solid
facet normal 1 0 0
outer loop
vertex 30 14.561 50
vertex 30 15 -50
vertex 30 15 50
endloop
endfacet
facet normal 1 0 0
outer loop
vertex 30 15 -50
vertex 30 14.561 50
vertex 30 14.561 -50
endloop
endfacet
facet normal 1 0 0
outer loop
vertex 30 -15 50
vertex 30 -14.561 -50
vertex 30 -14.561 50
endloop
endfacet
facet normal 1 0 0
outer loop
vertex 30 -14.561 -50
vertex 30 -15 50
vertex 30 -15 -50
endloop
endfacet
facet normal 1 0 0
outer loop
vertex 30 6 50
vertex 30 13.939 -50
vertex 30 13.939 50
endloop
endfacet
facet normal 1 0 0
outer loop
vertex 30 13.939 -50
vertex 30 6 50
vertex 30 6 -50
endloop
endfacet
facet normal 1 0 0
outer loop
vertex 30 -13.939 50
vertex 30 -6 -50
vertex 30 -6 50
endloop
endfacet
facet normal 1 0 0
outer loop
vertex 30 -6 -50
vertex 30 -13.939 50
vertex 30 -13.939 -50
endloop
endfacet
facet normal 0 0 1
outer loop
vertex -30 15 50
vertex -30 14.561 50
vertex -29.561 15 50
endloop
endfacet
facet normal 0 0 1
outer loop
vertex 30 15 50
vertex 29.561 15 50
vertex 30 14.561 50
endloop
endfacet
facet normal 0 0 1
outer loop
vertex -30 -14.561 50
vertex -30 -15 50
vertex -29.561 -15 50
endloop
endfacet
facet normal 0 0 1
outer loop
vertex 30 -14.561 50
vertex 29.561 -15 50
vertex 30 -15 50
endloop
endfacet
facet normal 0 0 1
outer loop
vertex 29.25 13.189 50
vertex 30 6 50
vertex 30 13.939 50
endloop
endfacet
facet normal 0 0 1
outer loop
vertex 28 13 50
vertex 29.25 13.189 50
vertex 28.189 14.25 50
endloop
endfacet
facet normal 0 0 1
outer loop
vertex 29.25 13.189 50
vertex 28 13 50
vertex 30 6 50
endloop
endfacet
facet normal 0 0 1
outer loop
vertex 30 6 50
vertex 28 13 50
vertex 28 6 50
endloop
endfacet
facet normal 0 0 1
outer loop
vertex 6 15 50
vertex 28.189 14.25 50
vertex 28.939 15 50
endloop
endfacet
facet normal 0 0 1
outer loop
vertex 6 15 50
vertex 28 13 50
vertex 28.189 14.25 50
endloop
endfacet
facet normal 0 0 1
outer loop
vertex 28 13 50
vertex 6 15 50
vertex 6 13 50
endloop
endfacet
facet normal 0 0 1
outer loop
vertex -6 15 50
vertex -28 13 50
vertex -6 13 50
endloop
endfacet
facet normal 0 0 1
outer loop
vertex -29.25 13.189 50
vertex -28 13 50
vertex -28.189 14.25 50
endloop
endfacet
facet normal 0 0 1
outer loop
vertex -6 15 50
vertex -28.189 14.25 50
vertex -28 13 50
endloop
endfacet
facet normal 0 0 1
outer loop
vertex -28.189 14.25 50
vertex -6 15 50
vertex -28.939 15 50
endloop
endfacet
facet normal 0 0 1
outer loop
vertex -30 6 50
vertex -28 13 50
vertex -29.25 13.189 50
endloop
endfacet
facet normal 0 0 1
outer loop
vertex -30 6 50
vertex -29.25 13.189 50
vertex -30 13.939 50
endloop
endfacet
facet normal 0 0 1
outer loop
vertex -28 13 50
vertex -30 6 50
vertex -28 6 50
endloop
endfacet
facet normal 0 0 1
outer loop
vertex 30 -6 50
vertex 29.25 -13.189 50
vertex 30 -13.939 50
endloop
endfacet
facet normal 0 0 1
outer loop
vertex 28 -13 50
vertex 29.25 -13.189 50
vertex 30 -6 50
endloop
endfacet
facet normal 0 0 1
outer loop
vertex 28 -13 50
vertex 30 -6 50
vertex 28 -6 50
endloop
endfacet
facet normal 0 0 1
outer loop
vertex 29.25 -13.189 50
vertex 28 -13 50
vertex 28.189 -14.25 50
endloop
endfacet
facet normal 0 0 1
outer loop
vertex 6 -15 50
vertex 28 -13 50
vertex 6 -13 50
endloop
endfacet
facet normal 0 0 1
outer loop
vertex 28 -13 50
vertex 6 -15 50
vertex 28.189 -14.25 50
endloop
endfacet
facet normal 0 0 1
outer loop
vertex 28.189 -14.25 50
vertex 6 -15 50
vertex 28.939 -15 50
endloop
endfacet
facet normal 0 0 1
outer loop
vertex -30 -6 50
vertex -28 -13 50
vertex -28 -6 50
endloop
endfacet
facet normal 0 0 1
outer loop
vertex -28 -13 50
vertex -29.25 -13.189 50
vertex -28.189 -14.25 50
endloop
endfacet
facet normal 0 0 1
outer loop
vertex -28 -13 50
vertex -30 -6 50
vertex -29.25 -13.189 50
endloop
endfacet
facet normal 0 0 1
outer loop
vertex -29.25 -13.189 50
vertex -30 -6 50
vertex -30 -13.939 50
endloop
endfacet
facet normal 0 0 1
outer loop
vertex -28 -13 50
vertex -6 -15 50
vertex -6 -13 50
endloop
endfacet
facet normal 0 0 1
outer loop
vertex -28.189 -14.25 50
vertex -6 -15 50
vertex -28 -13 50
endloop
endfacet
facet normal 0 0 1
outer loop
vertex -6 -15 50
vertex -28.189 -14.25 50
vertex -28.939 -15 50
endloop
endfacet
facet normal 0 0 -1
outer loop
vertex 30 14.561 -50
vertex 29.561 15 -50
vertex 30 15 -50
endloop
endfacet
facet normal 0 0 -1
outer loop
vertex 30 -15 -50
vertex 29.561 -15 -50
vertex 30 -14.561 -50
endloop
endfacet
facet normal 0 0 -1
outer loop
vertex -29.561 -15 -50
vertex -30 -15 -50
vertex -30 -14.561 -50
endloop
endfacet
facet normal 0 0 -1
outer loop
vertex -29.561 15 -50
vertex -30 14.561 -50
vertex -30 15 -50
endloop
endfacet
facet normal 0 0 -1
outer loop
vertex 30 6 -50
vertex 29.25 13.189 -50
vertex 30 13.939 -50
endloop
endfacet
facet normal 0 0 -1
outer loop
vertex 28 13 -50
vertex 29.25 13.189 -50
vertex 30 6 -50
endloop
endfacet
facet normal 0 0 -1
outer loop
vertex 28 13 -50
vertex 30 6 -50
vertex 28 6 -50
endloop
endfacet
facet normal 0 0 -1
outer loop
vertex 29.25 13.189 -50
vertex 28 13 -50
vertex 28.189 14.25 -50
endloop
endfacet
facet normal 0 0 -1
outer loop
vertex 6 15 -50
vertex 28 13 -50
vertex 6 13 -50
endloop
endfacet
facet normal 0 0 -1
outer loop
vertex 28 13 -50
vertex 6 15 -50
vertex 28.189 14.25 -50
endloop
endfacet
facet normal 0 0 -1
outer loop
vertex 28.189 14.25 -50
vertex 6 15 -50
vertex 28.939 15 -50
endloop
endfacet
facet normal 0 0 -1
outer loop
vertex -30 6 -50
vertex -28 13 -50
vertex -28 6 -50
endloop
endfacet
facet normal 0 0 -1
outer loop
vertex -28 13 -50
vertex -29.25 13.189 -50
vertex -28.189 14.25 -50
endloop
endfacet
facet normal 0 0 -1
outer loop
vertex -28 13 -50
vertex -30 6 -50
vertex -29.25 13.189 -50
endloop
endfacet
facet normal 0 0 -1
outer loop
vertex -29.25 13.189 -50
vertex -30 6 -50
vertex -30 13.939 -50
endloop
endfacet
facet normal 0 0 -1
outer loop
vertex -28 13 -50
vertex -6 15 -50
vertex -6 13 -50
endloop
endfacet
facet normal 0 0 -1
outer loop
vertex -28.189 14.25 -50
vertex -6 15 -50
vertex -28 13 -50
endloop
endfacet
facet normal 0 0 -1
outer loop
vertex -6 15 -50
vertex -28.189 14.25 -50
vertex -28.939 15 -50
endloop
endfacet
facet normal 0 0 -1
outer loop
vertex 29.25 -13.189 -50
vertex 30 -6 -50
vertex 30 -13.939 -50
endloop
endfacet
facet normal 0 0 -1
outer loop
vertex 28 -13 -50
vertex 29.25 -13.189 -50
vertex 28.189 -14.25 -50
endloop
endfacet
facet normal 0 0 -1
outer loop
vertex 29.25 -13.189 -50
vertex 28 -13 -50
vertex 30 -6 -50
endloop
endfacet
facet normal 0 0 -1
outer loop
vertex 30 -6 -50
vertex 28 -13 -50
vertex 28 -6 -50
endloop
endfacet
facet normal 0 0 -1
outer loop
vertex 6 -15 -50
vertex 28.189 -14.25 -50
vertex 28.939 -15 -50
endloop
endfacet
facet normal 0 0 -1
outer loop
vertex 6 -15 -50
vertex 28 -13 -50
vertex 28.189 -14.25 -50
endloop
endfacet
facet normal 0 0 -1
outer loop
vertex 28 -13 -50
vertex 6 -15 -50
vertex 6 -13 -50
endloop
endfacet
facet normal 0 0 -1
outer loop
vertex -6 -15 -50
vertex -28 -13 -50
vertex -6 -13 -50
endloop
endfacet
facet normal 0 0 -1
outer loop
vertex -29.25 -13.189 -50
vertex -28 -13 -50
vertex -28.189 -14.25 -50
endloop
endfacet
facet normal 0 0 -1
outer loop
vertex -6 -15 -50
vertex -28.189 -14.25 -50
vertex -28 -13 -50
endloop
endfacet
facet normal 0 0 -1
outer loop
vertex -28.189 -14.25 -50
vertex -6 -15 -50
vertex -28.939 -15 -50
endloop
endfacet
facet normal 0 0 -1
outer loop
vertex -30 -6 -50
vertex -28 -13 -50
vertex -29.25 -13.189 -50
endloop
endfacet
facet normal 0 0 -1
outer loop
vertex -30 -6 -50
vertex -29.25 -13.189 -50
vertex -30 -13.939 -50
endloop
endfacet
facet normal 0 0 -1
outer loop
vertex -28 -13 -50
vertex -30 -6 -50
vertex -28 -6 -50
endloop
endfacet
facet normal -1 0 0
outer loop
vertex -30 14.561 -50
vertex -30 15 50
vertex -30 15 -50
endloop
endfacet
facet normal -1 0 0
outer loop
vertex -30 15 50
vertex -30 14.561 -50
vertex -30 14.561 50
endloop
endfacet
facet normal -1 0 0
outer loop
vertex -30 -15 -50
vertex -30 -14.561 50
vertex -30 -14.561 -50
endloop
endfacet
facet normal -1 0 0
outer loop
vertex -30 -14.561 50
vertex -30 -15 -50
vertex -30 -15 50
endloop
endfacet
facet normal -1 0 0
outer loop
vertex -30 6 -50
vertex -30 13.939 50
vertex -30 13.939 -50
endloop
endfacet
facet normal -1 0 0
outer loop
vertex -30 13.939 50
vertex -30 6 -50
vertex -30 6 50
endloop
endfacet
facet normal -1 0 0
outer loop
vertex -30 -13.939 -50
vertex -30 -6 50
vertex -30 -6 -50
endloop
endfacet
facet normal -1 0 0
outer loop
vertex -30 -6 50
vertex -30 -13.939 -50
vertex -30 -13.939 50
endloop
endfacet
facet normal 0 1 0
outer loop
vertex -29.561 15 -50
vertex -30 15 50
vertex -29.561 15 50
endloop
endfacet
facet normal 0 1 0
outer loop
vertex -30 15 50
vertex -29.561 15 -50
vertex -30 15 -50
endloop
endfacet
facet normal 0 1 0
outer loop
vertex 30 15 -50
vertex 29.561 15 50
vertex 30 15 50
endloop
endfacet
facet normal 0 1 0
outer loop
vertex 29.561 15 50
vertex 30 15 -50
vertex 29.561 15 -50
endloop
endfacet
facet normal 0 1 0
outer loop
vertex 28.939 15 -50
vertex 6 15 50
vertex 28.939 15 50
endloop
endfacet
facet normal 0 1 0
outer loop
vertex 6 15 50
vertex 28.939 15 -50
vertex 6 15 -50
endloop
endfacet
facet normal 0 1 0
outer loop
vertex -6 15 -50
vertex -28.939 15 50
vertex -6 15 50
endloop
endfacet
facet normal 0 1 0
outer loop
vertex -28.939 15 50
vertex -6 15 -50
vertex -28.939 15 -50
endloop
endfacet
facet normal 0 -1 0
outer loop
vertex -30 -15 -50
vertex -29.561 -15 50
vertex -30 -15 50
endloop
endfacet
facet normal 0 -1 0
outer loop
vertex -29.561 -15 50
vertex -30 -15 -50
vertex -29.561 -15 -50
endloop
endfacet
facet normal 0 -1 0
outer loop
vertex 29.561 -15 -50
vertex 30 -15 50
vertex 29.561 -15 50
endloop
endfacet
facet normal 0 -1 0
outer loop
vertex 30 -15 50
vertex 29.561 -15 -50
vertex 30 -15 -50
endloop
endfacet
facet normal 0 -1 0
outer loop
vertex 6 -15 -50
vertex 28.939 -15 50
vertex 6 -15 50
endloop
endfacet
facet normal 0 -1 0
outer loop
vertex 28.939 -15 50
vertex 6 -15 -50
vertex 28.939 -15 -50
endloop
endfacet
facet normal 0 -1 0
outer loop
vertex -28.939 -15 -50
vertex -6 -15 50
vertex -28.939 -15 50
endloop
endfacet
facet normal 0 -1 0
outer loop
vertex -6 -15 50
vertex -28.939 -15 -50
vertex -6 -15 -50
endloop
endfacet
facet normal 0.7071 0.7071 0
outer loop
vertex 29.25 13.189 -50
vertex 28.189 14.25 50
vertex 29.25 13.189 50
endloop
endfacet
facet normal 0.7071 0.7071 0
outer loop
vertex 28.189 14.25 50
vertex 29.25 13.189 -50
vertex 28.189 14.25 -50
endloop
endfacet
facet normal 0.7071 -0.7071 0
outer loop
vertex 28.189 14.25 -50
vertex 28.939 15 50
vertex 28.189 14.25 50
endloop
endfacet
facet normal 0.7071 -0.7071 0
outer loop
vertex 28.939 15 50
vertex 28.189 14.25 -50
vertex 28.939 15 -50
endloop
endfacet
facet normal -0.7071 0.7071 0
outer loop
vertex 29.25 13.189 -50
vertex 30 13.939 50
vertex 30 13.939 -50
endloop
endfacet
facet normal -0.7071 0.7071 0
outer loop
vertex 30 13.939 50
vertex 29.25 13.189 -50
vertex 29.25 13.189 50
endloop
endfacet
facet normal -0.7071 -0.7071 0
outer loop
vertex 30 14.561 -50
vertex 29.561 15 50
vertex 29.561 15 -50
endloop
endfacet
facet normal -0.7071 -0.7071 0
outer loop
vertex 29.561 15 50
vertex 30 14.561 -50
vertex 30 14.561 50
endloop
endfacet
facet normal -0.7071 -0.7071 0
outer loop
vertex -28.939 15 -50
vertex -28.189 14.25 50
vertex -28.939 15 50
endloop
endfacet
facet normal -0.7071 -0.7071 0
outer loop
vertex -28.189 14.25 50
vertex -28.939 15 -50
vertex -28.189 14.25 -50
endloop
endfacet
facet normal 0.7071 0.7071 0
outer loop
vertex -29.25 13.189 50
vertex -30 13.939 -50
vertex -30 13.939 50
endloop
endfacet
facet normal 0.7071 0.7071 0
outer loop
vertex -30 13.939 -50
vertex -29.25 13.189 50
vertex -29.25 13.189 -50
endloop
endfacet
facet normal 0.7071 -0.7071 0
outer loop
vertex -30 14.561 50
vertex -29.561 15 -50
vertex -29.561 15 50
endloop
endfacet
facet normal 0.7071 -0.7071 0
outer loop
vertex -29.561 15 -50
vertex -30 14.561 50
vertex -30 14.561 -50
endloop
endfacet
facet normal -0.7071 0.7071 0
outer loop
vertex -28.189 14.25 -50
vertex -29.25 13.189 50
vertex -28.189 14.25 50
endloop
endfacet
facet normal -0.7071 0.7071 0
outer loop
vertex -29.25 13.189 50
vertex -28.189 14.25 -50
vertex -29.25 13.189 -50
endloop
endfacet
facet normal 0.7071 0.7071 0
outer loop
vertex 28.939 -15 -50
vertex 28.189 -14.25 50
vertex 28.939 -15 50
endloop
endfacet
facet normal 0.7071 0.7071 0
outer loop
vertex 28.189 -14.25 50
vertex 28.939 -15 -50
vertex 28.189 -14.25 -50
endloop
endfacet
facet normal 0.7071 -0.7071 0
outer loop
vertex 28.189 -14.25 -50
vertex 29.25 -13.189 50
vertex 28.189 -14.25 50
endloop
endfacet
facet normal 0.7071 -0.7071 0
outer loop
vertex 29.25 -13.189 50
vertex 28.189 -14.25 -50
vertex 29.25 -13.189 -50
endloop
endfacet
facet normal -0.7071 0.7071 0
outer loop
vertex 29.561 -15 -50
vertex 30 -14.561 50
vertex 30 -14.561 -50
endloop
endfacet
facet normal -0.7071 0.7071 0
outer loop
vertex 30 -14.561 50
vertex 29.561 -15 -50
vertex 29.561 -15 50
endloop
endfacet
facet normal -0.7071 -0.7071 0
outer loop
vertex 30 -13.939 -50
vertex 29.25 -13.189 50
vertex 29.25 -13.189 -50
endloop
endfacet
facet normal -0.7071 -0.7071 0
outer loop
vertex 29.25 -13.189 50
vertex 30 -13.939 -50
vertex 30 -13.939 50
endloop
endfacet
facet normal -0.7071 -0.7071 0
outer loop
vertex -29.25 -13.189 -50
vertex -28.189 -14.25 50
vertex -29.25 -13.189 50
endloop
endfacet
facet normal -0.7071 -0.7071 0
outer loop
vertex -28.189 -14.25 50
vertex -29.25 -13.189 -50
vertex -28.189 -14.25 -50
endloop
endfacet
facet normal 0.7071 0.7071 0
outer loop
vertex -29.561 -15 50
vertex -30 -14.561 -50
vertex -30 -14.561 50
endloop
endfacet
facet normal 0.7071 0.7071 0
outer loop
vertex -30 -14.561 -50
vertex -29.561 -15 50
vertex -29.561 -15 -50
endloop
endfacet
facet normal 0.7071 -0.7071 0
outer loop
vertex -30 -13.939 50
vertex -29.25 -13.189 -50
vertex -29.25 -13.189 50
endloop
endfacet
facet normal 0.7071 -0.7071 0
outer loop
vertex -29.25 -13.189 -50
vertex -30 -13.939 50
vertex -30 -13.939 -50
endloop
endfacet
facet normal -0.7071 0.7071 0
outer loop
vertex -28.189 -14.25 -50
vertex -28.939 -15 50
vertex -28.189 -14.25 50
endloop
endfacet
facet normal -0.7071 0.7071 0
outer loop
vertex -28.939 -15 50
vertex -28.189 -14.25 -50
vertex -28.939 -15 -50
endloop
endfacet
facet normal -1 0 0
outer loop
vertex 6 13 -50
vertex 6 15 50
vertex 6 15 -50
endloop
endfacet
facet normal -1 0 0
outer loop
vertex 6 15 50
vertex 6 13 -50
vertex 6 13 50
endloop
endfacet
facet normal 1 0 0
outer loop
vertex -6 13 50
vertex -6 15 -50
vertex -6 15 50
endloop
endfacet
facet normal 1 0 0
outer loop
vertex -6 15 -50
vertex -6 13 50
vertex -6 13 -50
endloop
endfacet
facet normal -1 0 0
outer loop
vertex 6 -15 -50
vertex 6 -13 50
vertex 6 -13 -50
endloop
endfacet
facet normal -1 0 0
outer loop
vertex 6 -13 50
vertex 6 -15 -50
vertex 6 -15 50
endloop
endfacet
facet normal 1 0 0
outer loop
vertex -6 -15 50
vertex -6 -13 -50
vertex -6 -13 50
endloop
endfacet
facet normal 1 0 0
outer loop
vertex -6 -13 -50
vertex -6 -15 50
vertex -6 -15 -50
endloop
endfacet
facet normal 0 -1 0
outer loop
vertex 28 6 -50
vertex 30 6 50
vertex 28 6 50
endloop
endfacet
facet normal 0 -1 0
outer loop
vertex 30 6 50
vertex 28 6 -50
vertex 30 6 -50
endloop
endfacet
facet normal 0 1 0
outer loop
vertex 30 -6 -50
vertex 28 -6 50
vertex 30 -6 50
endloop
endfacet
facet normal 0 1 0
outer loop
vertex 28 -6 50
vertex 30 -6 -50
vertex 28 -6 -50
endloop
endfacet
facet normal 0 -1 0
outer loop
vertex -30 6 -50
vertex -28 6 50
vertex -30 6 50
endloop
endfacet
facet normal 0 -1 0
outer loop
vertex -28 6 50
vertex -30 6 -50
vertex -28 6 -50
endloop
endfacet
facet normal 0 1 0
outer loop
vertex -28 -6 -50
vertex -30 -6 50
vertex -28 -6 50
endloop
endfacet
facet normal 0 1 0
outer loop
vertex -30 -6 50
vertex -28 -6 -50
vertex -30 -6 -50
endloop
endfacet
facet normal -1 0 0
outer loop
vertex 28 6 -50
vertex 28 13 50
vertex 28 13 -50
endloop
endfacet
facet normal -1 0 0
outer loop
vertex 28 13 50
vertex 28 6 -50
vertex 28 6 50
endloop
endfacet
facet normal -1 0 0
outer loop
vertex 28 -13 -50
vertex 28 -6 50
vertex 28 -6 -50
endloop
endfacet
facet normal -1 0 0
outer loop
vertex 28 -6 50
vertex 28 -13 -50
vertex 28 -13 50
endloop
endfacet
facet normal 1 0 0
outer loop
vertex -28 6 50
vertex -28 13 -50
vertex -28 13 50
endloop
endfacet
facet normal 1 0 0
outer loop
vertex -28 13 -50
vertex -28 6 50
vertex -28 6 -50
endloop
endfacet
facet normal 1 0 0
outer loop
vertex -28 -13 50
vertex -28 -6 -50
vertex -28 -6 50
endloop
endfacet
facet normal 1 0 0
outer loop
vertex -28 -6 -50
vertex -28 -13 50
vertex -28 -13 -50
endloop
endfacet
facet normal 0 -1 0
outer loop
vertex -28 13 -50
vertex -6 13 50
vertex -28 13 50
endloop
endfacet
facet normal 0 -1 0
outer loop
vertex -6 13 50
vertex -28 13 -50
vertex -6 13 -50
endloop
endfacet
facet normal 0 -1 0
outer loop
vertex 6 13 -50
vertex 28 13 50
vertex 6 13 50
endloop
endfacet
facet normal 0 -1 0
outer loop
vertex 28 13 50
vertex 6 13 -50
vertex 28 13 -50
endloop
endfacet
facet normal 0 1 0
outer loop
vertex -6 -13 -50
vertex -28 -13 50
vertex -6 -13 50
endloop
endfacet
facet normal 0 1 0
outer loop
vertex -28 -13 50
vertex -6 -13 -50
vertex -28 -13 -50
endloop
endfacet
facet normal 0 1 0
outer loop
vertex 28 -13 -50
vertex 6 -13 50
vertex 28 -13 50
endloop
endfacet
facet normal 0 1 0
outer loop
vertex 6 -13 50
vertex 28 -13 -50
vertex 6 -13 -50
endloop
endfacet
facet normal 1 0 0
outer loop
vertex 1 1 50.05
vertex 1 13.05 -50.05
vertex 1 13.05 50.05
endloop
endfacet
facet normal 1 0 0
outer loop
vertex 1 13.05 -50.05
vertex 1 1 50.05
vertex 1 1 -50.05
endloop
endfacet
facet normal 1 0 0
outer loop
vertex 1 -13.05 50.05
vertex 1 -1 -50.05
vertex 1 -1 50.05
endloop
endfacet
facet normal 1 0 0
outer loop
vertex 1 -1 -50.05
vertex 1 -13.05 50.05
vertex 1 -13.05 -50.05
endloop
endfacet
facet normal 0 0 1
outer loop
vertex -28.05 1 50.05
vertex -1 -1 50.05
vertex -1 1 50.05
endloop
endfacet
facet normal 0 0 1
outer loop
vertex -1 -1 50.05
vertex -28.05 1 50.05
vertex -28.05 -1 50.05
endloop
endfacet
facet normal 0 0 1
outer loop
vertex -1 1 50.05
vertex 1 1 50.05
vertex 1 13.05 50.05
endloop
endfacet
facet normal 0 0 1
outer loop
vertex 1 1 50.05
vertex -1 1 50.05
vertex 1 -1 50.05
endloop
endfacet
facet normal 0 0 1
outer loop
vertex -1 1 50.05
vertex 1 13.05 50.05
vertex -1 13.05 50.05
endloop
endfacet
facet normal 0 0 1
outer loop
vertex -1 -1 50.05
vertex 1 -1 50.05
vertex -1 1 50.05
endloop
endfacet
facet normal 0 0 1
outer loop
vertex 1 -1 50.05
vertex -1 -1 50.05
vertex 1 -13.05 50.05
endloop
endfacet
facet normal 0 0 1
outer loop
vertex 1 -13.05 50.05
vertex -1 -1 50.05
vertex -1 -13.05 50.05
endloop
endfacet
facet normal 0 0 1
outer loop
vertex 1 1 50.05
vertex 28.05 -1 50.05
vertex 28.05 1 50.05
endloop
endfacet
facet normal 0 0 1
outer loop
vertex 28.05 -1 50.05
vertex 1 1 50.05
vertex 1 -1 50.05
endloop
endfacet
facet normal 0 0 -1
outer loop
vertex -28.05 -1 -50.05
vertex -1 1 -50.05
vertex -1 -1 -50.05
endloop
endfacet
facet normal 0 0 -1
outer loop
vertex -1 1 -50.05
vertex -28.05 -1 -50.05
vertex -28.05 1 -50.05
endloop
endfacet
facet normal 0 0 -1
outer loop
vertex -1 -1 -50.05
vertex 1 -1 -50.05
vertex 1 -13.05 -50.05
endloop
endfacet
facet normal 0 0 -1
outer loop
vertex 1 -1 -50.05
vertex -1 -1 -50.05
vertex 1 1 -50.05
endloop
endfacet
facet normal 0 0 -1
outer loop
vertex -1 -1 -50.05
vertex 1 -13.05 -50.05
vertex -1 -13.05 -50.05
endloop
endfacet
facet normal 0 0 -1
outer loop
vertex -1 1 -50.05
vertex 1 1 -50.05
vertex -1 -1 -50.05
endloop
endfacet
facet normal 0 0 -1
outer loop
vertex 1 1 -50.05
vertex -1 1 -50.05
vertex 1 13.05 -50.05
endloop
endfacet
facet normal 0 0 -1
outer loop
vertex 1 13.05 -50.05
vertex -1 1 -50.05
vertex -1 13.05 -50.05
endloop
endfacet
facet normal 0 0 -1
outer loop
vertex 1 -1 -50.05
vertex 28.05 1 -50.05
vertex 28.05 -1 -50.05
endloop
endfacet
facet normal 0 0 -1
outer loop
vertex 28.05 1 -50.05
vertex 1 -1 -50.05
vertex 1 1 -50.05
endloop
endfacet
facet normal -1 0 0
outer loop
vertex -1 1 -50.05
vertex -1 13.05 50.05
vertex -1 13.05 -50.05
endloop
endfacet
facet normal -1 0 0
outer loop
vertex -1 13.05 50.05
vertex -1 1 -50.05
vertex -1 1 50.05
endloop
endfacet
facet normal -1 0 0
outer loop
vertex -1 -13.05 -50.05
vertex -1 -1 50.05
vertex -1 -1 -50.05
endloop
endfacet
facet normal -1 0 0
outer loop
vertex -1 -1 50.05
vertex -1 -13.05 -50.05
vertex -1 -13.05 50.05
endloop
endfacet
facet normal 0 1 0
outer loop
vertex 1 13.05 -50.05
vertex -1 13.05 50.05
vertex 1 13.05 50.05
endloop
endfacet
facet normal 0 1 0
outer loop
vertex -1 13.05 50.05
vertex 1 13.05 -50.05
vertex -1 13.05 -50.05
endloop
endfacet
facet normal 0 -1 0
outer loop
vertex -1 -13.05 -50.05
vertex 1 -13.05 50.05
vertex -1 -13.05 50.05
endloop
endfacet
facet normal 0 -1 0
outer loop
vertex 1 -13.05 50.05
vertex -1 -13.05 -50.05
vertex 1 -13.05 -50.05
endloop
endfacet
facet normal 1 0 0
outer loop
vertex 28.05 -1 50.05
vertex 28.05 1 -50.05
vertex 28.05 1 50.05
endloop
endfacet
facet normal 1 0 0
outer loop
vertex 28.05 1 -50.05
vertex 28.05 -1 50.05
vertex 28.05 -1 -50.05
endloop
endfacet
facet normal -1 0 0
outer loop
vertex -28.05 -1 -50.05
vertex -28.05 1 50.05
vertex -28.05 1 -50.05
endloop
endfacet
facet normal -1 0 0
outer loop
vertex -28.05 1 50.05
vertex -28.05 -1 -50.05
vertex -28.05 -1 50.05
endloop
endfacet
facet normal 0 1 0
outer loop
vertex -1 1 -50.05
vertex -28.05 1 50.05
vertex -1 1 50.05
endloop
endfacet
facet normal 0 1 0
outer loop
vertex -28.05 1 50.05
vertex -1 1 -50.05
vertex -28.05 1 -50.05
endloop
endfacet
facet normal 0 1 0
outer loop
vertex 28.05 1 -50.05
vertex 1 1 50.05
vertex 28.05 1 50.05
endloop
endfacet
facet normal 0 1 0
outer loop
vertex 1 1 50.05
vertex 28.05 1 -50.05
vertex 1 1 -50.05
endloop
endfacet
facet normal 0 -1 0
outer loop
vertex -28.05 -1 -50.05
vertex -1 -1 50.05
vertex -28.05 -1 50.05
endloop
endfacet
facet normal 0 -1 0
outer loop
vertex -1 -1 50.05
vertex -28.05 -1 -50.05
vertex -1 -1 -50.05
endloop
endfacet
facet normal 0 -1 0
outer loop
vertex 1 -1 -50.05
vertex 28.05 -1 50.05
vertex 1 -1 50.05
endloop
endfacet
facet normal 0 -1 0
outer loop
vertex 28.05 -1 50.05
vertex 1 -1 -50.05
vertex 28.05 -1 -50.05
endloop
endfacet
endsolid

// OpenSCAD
// 30x60 aluminum extrusion profile (simplified but recognizable), 100mm long
// One connected solid, correct overall dimensions: 60 (X) x 30 (Y) x 100 (Z)

$fn = 64;

// Parameters
profile_W = 60.0;   // X
profile_H = 30.0;   // Y
length_L  = 100.0;  // Z

wall_t    = 2.0;    // outer wall thickness
slot_open = 6.0;    // T-slot mouth opening width
slot_depth= 7.0;    // depth from outer face to inner cavity
slot_wide = 12.0;   // wider internal part of T-slot
web_t     = 2.0;    // internal web thickness
center_hole_d = 6.0;

corner_chamfer = 1.5;

eps = 0.05;

// --- Helpers ---
module chamfered_block(w,h,l,c){
    // Chamfer only the 4 long edges (along Z) using 45° cuts
    difference(){
        cube([w,h,l], center=true);

        // TR
        translate([ w/2 - c/2,  h/2 - c/2, 0])
            rotate([0,0,45]) cube([c,c,l+2*eps], center=true);
        // TL
        translate([-w/2 + c/2,  h/2 - c/2, 0])
            rotate([0,0,45]) cube([c,c,l+2*eps], center=true);
        // BR
        translate([ w/2 - c/2, -h/2 + c/2, 0])
            rotate([0,0,45]) cube([c,c,l+2*eps], center=true);
        // BL
        translate([-w/2 + c/2, -h/2 + c/2, 0])
            rotate([0,0,45]) cube([c,c,l+2*eps], center=true);
    }
}

module tslot_cut_y(sign=1){
    // Cuts a T-slot on +Y (sign=1) or -Y (sign=-1) face
    union(){
        // mouth
        translate([0, sign*(profile_H/2 - slot_depth/2), 0])
            cube([slot_open, slot_depth + 2*eps, length_L + 2*eps], center=true);

        // wider internal pocket
        translate([0, sign*(profile_H/2 - (slot_depth*0.75)/2), 0])
            cube([slot_wide, slot_depth*0.75 + 2*eps, length_L + 2*eps], center=true);
    }
}

module tslot_cut_x(sign=1){
    // Cuts a T-slot on +X (sign=1) or -X (sign=-1) face
    union(){
        // mouth
        translate([sign*(profile_W/2 - slot_depth/2), 0, 0])
            cube([slot_depth + 2*eps, slot_open, length_L + 2*eps], center=true);

        // wider internal pocket
        translate([sign*(profile_W/2 - (slot_depth*0.75)/2), 0, 0])
            cube([slot_depth*0.75 + 2*eps, slot_wide, length_L + 2*eps], center=true);
    }
}

module internal_void(){
    // Main internal cavity leaving outer walls
    cube([profile_W - 2*wall_t, profile_H - 2*wall_t, length_L + 2*eps], center=true);
}

module internal_webs(){
    // Cross webs (keeps one connected solid). Slightly oversized in Z for robust union.
    union(){
        cube([web_t, profile_H - 2*wall_t + 2*eps, length_L + 2*eps], center=true);
        cube([profile_W - 2*wall_t + 2*eps, web_t, length_L + 2*eps], center=true);
    }
}

module center_bore(){
    cylinder(d=center_hole_d, h=length_L + 2*eps, center=true);
}

module extrusion_body(){
    // Build as: (outer shell with slots and bore) UNION (webs)
    // This guarantees a single connected solid and avoids "blank" top-level CSG issues.
    union(){
        difference(){
            chamfered_block(profile_W, profile_H, length_L, corner_chamfer);

            // Hollow interior
            internal_void();

            // T-slots on all four sides
            tslot_cut_y( 1);
            tslot_cut_y(-1);
            tslot_cut_x( 1);
            tslot_cut_x(-1);

            // Center bore
            center_bore();
        }

        // Webs overlap into remaining material by eps to ensure manifold connectivity
        internal_webs();
    }
}

// --- Final model ---
extrusion_body();
